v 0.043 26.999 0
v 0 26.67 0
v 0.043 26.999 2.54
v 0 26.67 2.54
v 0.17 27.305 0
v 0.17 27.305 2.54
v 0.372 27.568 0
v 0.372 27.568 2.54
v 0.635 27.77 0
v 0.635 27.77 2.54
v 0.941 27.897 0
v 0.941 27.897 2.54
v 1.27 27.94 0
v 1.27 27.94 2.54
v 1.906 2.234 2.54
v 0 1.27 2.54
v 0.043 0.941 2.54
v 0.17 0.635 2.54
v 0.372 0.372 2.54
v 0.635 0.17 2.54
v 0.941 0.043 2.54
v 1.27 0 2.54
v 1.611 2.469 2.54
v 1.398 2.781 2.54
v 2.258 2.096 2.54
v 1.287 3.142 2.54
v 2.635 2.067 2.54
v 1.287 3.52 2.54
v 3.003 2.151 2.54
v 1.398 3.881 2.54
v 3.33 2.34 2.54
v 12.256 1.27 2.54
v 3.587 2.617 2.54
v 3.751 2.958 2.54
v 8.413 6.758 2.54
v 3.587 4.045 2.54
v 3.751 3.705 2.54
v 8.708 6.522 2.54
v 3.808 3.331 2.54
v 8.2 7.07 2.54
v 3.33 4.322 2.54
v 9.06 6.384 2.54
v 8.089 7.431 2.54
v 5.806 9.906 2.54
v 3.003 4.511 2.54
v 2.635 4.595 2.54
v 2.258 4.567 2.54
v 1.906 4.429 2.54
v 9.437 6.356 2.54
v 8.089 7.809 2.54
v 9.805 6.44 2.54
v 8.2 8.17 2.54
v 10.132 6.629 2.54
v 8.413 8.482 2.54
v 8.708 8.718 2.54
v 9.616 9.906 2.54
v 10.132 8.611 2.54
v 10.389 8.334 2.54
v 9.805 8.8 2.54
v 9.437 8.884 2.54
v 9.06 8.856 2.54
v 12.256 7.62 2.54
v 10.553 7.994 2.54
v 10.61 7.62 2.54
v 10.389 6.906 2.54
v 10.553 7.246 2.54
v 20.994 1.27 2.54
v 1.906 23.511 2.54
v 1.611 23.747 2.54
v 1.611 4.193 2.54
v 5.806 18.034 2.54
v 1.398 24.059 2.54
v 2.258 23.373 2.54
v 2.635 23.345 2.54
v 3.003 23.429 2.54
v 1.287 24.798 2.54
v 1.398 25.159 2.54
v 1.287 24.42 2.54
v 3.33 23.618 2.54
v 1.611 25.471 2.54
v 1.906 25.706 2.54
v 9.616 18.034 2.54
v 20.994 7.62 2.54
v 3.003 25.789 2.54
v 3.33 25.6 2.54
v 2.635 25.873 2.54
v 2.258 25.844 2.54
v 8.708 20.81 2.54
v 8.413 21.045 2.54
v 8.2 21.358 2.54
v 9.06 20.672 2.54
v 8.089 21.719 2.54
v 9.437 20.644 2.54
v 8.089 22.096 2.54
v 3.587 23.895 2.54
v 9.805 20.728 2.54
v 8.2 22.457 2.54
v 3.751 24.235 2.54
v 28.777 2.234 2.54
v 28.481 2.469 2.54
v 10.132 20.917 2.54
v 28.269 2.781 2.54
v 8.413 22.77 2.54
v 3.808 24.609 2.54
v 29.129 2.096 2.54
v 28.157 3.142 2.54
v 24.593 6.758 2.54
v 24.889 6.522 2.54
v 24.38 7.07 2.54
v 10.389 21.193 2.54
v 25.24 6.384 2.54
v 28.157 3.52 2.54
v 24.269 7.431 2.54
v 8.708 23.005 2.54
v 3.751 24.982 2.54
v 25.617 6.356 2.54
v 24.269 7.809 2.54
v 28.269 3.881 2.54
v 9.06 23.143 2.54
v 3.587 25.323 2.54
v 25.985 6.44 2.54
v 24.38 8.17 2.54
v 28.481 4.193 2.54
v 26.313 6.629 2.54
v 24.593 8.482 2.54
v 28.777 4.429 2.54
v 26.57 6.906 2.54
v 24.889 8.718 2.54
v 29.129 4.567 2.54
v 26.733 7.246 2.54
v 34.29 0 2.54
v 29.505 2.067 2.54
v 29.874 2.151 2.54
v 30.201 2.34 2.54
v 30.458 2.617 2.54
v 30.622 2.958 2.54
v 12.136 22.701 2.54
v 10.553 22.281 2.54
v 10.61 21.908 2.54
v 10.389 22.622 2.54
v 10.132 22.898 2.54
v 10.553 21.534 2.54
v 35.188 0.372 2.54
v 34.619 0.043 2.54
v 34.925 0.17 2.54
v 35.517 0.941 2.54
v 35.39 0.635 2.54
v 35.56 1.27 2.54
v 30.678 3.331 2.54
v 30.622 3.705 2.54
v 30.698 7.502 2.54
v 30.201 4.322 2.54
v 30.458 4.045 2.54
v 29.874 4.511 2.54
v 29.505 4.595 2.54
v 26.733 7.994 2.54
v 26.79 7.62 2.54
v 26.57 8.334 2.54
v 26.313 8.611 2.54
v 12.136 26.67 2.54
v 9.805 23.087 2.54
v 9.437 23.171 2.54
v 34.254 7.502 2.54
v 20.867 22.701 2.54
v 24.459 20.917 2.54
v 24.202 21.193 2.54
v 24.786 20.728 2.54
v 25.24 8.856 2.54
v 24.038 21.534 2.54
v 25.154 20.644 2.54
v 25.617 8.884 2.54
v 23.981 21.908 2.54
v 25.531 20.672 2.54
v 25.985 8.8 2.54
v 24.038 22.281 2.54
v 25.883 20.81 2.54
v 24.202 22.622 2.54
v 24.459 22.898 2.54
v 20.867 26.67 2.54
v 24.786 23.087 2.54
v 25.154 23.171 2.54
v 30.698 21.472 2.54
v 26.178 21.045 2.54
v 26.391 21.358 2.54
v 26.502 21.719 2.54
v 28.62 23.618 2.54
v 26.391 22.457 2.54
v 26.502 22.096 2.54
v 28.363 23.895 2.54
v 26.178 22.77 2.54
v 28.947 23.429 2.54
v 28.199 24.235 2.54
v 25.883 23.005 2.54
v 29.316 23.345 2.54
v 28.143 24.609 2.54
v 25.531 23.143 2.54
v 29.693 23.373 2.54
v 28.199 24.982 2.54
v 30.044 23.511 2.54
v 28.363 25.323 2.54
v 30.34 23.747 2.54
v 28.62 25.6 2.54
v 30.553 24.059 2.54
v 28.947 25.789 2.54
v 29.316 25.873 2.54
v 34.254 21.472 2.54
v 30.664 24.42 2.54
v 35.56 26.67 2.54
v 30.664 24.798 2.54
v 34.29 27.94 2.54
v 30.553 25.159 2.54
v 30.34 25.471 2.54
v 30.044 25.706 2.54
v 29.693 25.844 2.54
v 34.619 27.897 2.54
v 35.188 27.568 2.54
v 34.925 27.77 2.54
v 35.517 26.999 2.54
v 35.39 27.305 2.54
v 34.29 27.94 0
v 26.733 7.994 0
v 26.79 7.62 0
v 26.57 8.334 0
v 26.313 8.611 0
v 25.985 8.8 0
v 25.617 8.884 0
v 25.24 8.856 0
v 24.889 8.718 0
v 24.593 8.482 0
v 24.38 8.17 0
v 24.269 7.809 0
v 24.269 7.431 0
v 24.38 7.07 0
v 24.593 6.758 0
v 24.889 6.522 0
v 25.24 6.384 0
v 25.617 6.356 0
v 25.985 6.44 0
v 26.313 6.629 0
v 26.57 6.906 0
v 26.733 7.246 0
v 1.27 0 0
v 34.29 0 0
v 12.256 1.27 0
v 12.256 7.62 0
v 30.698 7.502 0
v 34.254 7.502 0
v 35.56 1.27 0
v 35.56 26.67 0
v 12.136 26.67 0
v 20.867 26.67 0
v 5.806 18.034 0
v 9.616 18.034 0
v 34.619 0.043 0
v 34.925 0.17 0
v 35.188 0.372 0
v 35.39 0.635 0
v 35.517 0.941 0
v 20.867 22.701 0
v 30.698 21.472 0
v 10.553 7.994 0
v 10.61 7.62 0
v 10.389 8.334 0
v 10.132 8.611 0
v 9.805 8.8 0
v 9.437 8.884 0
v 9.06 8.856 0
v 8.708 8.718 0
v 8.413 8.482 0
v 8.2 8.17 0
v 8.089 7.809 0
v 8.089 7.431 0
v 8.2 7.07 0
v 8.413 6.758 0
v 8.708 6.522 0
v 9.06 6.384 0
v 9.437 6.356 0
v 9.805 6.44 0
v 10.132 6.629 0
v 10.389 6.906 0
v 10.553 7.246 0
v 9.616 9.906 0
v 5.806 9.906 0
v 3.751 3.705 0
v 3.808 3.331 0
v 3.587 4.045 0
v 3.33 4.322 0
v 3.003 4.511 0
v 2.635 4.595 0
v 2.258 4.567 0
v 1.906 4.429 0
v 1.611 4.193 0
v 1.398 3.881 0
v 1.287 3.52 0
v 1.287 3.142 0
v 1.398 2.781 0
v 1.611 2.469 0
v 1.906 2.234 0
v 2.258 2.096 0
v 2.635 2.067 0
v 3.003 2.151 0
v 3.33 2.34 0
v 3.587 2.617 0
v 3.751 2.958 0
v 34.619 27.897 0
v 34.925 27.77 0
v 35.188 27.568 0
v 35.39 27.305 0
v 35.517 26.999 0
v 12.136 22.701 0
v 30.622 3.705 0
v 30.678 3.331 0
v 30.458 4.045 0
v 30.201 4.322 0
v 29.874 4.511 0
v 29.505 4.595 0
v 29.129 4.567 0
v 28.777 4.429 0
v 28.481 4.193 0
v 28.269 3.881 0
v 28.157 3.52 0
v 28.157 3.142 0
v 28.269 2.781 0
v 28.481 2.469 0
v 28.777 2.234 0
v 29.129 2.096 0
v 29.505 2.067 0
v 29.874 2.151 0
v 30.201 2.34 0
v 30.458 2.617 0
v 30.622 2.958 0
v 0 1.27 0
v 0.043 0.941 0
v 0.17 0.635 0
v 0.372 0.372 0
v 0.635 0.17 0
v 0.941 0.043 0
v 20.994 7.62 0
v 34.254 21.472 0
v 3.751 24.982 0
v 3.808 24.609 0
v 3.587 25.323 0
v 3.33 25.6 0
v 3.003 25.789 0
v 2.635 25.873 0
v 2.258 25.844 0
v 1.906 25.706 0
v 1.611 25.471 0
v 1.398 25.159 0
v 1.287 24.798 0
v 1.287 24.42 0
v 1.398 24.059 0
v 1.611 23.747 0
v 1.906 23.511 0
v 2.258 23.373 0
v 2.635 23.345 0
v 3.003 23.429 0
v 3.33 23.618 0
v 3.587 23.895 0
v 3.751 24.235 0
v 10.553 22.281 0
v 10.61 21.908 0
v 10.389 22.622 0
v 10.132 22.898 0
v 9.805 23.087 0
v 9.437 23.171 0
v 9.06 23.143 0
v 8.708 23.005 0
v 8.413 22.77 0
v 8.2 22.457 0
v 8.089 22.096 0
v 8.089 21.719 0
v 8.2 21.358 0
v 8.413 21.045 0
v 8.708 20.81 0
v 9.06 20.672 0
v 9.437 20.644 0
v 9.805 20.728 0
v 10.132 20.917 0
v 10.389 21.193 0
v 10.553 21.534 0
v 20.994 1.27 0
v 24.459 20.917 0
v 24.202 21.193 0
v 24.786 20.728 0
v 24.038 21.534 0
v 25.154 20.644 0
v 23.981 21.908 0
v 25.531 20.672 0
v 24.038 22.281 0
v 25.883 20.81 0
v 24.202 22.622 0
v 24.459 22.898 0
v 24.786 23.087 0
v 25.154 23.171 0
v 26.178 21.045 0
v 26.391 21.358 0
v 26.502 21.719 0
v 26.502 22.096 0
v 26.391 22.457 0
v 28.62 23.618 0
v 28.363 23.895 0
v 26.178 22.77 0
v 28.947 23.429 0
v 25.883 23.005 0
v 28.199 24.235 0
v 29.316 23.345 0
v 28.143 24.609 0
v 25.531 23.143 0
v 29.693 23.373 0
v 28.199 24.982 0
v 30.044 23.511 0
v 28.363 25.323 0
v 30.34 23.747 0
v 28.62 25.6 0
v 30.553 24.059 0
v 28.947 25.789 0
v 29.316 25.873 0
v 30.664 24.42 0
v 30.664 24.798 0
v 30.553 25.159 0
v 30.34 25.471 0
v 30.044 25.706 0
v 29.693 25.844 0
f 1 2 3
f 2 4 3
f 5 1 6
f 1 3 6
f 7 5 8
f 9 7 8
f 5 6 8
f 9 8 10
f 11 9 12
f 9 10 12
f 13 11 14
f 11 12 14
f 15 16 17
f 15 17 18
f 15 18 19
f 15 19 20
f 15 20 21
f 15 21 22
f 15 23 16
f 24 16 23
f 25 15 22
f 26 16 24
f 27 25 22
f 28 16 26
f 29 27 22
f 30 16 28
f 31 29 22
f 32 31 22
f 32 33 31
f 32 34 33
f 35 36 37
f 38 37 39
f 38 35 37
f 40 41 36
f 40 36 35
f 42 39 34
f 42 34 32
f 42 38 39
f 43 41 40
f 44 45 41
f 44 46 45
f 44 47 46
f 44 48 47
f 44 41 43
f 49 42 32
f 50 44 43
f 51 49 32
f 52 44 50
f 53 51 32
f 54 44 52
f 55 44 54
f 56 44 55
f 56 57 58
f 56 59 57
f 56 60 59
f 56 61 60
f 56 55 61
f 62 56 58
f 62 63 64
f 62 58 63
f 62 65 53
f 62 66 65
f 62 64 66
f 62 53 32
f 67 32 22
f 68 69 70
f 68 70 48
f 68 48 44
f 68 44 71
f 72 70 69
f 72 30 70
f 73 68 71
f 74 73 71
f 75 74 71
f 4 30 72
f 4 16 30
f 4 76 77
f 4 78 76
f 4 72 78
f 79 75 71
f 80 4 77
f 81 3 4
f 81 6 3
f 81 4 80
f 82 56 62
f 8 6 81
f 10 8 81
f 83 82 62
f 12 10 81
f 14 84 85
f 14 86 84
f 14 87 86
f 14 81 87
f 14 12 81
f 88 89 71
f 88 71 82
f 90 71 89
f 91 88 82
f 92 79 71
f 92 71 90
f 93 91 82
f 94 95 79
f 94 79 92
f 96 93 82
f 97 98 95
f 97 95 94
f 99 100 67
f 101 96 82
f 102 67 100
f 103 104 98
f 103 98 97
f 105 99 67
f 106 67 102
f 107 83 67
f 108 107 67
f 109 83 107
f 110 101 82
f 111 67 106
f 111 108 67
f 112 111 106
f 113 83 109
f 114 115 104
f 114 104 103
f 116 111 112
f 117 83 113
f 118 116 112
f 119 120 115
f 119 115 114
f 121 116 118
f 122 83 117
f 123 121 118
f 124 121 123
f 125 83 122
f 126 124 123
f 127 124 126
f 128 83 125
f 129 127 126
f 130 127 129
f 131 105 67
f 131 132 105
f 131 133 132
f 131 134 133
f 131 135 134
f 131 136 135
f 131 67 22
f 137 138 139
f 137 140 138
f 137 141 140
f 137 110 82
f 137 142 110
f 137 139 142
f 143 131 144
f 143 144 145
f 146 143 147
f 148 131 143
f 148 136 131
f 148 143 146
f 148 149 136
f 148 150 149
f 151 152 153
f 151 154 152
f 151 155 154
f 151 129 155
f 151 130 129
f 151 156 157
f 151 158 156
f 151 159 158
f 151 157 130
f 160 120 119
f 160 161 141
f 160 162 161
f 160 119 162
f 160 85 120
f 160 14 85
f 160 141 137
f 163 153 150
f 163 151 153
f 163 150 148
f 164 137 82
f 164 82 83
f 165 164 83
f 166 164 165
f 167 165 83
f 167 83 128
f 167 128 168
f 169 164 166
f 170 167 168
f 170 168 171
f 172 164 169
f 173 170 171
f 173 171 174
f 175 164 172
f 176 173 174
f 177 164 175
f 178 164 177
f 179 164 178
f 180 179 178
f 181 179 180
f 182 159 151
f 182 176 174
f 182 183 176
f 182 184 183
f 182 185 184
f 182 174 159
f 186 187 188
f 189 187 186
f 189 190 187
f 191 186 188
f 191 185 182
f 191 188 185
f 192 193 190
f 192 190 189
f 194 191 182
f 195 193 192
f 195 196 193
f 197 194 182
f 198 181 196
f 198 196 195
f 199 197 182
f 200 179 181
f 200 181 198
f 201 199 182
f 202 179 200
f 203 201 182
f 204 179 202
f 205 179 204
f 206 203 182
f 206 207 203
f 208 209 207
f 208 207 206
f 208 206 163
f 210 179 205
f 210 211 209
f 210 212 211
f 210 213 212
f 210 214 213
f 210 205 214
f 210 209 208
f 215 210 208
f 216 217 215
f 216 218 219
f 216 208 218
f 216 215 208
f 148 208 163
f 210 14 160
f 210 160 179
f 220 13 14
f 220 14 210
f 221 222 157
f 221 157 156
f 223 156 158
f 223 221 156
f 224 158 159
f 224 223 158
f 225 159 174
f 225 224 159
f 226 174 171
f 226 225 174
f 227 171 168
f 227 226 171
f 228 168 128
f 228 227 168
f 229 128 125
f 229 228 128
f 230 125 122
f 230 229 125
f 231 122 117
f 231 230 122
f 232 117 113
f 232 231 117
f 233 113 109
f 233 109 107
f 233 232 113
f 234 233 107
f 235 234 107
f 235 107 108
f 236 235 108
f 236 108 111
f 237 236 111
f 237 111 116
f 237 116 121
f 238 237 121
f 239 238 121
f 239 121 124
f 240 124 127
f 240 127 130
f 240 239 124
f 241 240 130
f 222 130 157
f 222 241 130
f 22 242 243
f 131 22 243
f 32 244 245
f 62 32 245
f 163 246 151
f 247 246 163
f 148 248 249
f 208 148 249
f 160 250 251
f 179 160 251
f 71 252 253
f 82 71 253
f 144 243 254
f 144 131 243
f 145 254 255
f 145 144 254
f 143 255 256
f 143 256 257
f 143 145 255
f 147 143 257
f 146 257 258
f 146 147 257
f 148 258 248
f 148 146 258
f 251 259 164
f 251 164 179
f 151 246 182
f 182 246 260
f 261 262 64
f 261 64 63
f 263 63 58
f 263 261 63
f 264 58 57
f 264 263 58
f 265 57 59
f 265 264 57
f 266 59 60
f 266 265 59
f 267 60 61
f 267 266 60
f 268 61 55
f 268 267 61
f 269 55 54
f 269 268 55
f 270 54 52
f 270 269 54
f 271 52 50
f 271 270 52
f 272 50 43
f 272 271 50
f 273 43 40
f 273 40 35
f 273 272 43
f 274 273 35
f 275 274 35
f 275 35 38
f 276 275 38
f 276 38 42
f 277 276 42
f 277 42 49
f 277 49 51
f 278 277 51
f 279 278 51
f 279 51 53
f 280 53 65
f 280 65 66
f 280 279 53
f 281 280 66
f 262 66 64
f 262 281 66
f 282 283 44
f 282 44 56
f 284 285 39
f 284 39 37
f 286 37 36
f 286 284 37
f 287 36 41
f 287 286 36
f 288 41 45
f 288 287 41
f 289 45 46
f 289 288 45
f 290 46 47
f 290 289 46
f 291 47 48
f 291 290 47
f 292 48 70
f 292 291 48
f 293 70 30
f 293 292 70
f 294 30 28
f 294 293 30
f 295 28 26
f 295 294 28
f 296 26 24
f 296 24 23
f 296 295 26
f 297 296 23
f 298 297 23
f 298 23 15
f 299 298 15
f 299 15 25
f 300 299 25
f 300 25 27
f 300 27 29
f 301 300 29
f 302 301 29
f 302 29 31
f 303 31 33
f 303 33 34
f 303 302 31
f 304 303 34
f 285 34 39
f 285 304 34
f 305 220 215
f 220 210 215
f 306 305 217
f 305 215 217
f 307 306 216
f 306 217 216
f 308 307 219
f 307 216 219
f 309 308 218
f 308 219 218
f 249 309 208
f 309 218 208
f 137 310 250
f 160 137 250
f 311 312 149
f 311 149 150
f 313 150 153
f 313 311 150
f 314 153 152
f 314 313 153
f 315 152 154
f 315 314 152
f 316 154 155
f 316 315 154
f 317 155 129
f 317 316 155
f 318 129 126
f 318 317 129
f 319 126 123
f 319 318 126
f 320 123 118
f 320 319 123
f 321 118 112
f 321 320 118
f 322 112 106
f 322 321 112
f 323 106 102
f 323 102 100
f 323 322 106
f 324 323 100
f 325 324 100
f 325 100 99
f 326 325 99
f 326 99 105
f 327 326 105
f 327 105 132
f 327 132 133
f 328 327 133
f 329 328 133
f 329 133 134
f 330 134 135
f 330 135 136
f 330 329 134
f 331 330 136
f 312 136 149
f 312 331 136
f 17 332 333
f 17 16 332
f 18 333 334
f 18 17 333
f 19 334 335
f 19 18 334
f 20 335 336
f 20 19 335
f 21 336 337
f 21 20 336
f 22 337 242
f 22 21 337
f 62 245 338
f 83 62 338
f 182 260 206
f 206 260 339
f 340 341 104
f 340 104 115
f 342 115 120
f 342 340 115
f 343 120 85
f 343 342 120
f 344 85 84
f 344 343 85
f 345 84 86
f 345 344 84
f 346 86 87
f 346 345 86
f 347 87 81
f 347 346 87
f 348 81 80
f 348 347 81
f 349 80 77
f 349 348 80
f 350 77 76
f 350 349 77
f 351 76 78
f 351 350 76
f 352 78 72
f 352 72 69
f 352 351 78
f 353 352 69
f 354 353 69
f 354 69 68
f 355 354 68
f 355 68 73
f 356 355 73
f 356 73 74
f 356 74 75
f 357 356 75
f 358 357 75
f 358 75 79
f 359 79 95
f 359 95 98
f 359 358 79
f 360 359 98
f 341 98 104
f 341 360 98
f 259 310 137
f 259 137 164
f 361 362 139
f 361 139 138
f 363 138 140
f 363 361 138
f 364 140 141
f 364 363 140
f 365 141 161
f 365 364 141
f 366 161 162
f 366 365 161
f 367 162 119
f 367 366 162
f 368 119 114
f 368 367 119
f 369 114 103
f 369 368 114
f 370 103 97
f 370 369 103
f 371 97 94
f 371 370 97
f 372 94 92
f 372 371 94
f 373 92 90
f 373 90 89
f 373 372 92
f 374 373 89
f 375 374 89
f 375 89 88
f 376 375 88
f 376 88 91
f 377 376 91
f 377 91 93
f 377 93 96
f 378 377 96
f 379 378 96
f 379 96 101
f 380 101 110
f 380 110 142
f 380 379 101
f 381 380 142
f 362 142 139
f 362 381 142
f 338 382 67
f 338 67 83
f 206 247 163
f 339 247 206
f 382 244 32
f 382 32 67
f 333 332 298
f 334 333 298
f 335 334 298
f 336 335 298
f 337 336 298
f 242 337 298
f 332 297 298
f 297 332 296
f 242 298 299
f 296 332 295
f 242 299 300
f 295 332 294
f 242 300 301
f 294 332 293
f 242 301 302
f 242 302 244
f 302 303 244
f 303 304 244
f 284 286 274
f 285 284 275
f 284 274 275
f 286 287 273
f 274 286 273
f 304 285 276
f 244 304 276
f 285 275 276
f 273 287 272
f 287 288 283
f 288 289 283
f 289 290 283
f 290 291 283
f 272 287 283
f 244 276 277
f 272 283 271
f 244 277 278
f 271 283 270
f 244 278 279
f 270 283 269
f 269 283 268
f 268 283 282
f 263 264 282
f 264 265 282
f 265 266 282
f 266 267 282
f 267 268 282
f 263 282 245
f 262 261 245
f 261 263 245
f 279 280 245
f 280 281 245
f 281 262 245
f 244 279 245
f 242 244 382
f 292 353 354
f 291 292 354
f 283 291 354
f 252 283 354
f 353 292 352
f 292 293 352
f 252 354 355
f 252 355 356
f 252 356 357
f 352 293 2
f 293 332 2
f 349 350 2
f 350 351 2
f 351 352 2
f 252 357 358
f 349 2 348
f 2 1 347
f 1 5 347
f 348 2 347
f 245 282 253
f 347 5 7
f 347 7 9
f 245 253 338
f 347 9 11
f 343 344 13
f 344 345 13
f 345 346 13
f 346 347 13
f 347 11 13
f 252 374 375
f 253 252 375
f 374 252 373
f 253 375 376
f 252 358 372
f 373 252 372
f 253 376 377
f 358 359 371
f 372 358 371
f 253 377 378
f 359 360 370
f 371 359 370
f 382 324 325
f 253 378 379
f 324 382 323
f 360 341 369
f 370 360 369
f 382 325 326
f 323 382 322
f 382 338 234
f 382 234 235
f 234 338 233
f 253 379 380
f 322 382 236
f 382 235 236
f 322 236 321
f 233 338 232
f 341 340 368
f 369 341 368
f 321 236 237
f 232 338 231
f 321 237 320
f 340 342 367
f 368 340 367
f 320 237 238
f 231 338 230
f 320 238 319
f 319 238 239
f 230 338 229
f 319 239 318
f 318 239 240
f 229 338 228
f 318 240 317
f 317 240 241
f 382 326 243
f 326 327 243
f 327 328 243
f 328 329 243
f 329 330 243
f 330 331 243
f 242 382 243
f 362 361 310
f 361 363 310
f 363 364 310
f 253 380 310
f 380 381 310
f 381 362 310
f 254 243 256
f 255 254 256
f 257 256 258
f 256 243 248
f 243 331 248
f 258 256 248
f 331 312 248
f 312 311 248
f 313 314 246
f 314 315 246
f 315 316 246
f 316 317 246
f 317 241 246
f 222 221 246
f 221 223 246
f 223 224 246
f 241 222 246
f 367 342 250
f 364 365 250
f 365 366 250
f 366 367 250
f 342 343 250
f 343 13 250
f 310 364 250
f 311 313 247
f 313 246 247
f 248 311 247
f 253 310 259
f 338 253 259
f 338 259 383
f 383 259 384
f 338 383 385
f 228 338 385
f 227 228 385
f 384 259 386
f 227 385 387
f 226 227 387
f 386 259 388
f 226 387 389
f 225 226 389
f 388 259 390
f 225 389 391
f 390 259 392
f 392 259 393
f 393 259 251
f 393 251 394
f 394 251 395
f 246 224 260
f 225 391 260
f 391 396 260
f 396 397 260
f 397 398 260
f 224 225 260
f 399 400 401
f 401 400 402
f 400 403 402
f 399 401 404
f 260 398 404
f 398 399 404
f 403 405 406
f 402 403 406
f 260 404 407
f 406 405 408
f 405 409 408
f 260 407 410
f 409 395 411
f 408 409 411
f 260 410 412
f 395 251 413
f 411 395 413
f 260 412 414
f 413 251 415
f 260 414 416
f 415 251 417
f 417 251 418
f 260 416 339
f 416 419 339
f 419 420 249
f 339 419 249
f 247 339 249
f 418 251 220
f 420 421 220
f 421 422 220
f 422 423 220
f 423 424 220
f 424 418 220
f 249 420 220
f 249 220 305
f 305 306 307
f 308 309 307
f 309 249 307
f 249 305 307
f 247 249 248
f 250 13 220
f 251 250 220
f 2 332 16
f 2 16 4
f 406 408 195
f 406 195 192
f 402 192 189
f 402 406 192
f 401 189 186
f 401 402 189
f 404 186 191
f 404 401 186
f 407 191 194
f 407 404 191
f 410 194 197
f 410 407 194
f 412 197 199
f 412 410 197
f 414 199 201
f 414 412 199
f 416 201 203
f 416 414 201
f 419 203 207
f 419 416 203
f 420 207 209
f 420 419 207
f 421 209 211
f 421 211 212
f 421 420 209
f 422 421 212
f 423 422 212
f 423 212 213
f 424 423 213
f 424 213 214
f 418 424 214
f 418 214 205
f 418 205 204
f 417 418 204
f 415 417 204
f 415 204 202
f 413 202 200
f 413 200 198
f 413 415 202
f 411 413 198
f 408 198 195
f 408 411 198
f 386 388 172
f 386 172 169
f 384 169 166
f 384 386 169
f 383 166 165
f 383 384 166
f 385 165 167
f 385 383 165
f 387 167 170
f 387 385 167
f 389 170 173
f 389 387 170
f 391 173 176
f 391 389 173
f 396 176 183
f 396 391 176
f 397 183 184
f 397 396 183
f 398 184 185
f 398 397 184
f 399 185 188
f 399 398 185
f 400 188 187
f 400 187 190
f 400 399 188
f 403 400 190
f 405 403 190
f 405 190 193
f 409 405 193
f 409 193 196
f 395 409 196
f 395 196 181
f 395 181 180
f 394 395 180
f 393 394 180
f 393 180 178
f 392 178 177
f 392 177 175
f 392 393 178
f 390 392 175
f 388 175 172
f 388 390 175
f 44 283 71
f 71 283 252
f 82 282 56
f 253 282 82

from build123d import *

# Parameters (mm, degrees)
SKETCH1_W           = 35.56
SKETCH1_H           = 27.94
SKETCH1_R           = 1.267511842
SKETCH1_W_2         = 3.556
SKETCH1_H_2         = 13.97
SKETCH1_W_3         = 8.73125
SKETCH1_H_3         = 3.96875
SKETCH1_W_4         = 3.81
SKETCH1_H_4         = 8.128
SKETCH1_W_5         = 8.7379065
SKETCH1_H_5         = 6.35
BOSS_EXTRUDE1_DEPTH = 2.54
FILLET1_R           = 1.27


with BuildPart() as part:
    # Sketch1 → Boss-Extrude1 (new body)
    with BuildSketch(Plane.XY):
        with Locations((17.78, 13.97)):
            Rectangle(SKETCH1_W, SKETCH1_H)
        with Locations((2.54, 24.608738158)):
            Circle(SKETCH1_R, mode=Mode.SUBTRACT)
        with Locations(Location((25.24883074, 21.9075, 0), (0, 0, 180))):
            Circle(SKETCH1_R, mode=Mode.SUBTRACT)
        with Locations((9.34208074, 21.9075)):
            Circle(SKETCH1_R, mode=Mode.SUBTRACT)
        with Locations(Location((29.410568897, 24.608738158, 0), (0, 0, 180))):
            Circle(SKETCH1_R, mode=Mode.SUBTRACT)
        with Locations((25.52228569, 7.62)):
            Circle(SKETCH1_R, mode=Mode.SUBTRACT)
        with Locations((9.34208074, 7.62)):
            Circle(SKETCH1_R, mode=Mode.SUBTRACT)
        with Locations((2.54, 3.331261842)):
            Circle(SKETCH1_R, mode=Mode.SUBTRACT)
        with Locations((29.410568897, 3.331261842)):
            Circle(SKETCH1_R, mode=Mode.SUBTRACT)
        with Locations((32.47553569, 14.486722307)):
            Rectangle(SKETCH1_W_2, SKETCH1_H_2, mode=Mode.SUBTRACT)
        with Locations((16.50170574, 24.685625)):
            Rectangle(SKETCH1_W_3, SKETCH1_H_3, mode=Mode.SUBTRACT)
        with Locations((7.7109414, 13.97)):
            Rectangle(SKETCH1_W_4, SKETCH1_H_4, mode=Mode.SUBTRACT)
        with Locations((16.62537749, 4.445)):
            Rectangle(SKETCH1_W_5, SKETCH1_H_5, mode=Mode.SUBTRACT)
    extrude(amount=BOSS_EXTRUDE1_DEPTH)

    # Fillet1
    fillet1_edges = [part.edges().sort_by_distance(p)[0] for p in [
        (0, 27.94, 1.27),
        (35.56, 27.94, 1.27),
        (35.56, 0, 1.27),
        (0, 0, 1.27),
    ]]
    fillet(fillet1_edges, radius=FILLET1_R)


solid = part.part
